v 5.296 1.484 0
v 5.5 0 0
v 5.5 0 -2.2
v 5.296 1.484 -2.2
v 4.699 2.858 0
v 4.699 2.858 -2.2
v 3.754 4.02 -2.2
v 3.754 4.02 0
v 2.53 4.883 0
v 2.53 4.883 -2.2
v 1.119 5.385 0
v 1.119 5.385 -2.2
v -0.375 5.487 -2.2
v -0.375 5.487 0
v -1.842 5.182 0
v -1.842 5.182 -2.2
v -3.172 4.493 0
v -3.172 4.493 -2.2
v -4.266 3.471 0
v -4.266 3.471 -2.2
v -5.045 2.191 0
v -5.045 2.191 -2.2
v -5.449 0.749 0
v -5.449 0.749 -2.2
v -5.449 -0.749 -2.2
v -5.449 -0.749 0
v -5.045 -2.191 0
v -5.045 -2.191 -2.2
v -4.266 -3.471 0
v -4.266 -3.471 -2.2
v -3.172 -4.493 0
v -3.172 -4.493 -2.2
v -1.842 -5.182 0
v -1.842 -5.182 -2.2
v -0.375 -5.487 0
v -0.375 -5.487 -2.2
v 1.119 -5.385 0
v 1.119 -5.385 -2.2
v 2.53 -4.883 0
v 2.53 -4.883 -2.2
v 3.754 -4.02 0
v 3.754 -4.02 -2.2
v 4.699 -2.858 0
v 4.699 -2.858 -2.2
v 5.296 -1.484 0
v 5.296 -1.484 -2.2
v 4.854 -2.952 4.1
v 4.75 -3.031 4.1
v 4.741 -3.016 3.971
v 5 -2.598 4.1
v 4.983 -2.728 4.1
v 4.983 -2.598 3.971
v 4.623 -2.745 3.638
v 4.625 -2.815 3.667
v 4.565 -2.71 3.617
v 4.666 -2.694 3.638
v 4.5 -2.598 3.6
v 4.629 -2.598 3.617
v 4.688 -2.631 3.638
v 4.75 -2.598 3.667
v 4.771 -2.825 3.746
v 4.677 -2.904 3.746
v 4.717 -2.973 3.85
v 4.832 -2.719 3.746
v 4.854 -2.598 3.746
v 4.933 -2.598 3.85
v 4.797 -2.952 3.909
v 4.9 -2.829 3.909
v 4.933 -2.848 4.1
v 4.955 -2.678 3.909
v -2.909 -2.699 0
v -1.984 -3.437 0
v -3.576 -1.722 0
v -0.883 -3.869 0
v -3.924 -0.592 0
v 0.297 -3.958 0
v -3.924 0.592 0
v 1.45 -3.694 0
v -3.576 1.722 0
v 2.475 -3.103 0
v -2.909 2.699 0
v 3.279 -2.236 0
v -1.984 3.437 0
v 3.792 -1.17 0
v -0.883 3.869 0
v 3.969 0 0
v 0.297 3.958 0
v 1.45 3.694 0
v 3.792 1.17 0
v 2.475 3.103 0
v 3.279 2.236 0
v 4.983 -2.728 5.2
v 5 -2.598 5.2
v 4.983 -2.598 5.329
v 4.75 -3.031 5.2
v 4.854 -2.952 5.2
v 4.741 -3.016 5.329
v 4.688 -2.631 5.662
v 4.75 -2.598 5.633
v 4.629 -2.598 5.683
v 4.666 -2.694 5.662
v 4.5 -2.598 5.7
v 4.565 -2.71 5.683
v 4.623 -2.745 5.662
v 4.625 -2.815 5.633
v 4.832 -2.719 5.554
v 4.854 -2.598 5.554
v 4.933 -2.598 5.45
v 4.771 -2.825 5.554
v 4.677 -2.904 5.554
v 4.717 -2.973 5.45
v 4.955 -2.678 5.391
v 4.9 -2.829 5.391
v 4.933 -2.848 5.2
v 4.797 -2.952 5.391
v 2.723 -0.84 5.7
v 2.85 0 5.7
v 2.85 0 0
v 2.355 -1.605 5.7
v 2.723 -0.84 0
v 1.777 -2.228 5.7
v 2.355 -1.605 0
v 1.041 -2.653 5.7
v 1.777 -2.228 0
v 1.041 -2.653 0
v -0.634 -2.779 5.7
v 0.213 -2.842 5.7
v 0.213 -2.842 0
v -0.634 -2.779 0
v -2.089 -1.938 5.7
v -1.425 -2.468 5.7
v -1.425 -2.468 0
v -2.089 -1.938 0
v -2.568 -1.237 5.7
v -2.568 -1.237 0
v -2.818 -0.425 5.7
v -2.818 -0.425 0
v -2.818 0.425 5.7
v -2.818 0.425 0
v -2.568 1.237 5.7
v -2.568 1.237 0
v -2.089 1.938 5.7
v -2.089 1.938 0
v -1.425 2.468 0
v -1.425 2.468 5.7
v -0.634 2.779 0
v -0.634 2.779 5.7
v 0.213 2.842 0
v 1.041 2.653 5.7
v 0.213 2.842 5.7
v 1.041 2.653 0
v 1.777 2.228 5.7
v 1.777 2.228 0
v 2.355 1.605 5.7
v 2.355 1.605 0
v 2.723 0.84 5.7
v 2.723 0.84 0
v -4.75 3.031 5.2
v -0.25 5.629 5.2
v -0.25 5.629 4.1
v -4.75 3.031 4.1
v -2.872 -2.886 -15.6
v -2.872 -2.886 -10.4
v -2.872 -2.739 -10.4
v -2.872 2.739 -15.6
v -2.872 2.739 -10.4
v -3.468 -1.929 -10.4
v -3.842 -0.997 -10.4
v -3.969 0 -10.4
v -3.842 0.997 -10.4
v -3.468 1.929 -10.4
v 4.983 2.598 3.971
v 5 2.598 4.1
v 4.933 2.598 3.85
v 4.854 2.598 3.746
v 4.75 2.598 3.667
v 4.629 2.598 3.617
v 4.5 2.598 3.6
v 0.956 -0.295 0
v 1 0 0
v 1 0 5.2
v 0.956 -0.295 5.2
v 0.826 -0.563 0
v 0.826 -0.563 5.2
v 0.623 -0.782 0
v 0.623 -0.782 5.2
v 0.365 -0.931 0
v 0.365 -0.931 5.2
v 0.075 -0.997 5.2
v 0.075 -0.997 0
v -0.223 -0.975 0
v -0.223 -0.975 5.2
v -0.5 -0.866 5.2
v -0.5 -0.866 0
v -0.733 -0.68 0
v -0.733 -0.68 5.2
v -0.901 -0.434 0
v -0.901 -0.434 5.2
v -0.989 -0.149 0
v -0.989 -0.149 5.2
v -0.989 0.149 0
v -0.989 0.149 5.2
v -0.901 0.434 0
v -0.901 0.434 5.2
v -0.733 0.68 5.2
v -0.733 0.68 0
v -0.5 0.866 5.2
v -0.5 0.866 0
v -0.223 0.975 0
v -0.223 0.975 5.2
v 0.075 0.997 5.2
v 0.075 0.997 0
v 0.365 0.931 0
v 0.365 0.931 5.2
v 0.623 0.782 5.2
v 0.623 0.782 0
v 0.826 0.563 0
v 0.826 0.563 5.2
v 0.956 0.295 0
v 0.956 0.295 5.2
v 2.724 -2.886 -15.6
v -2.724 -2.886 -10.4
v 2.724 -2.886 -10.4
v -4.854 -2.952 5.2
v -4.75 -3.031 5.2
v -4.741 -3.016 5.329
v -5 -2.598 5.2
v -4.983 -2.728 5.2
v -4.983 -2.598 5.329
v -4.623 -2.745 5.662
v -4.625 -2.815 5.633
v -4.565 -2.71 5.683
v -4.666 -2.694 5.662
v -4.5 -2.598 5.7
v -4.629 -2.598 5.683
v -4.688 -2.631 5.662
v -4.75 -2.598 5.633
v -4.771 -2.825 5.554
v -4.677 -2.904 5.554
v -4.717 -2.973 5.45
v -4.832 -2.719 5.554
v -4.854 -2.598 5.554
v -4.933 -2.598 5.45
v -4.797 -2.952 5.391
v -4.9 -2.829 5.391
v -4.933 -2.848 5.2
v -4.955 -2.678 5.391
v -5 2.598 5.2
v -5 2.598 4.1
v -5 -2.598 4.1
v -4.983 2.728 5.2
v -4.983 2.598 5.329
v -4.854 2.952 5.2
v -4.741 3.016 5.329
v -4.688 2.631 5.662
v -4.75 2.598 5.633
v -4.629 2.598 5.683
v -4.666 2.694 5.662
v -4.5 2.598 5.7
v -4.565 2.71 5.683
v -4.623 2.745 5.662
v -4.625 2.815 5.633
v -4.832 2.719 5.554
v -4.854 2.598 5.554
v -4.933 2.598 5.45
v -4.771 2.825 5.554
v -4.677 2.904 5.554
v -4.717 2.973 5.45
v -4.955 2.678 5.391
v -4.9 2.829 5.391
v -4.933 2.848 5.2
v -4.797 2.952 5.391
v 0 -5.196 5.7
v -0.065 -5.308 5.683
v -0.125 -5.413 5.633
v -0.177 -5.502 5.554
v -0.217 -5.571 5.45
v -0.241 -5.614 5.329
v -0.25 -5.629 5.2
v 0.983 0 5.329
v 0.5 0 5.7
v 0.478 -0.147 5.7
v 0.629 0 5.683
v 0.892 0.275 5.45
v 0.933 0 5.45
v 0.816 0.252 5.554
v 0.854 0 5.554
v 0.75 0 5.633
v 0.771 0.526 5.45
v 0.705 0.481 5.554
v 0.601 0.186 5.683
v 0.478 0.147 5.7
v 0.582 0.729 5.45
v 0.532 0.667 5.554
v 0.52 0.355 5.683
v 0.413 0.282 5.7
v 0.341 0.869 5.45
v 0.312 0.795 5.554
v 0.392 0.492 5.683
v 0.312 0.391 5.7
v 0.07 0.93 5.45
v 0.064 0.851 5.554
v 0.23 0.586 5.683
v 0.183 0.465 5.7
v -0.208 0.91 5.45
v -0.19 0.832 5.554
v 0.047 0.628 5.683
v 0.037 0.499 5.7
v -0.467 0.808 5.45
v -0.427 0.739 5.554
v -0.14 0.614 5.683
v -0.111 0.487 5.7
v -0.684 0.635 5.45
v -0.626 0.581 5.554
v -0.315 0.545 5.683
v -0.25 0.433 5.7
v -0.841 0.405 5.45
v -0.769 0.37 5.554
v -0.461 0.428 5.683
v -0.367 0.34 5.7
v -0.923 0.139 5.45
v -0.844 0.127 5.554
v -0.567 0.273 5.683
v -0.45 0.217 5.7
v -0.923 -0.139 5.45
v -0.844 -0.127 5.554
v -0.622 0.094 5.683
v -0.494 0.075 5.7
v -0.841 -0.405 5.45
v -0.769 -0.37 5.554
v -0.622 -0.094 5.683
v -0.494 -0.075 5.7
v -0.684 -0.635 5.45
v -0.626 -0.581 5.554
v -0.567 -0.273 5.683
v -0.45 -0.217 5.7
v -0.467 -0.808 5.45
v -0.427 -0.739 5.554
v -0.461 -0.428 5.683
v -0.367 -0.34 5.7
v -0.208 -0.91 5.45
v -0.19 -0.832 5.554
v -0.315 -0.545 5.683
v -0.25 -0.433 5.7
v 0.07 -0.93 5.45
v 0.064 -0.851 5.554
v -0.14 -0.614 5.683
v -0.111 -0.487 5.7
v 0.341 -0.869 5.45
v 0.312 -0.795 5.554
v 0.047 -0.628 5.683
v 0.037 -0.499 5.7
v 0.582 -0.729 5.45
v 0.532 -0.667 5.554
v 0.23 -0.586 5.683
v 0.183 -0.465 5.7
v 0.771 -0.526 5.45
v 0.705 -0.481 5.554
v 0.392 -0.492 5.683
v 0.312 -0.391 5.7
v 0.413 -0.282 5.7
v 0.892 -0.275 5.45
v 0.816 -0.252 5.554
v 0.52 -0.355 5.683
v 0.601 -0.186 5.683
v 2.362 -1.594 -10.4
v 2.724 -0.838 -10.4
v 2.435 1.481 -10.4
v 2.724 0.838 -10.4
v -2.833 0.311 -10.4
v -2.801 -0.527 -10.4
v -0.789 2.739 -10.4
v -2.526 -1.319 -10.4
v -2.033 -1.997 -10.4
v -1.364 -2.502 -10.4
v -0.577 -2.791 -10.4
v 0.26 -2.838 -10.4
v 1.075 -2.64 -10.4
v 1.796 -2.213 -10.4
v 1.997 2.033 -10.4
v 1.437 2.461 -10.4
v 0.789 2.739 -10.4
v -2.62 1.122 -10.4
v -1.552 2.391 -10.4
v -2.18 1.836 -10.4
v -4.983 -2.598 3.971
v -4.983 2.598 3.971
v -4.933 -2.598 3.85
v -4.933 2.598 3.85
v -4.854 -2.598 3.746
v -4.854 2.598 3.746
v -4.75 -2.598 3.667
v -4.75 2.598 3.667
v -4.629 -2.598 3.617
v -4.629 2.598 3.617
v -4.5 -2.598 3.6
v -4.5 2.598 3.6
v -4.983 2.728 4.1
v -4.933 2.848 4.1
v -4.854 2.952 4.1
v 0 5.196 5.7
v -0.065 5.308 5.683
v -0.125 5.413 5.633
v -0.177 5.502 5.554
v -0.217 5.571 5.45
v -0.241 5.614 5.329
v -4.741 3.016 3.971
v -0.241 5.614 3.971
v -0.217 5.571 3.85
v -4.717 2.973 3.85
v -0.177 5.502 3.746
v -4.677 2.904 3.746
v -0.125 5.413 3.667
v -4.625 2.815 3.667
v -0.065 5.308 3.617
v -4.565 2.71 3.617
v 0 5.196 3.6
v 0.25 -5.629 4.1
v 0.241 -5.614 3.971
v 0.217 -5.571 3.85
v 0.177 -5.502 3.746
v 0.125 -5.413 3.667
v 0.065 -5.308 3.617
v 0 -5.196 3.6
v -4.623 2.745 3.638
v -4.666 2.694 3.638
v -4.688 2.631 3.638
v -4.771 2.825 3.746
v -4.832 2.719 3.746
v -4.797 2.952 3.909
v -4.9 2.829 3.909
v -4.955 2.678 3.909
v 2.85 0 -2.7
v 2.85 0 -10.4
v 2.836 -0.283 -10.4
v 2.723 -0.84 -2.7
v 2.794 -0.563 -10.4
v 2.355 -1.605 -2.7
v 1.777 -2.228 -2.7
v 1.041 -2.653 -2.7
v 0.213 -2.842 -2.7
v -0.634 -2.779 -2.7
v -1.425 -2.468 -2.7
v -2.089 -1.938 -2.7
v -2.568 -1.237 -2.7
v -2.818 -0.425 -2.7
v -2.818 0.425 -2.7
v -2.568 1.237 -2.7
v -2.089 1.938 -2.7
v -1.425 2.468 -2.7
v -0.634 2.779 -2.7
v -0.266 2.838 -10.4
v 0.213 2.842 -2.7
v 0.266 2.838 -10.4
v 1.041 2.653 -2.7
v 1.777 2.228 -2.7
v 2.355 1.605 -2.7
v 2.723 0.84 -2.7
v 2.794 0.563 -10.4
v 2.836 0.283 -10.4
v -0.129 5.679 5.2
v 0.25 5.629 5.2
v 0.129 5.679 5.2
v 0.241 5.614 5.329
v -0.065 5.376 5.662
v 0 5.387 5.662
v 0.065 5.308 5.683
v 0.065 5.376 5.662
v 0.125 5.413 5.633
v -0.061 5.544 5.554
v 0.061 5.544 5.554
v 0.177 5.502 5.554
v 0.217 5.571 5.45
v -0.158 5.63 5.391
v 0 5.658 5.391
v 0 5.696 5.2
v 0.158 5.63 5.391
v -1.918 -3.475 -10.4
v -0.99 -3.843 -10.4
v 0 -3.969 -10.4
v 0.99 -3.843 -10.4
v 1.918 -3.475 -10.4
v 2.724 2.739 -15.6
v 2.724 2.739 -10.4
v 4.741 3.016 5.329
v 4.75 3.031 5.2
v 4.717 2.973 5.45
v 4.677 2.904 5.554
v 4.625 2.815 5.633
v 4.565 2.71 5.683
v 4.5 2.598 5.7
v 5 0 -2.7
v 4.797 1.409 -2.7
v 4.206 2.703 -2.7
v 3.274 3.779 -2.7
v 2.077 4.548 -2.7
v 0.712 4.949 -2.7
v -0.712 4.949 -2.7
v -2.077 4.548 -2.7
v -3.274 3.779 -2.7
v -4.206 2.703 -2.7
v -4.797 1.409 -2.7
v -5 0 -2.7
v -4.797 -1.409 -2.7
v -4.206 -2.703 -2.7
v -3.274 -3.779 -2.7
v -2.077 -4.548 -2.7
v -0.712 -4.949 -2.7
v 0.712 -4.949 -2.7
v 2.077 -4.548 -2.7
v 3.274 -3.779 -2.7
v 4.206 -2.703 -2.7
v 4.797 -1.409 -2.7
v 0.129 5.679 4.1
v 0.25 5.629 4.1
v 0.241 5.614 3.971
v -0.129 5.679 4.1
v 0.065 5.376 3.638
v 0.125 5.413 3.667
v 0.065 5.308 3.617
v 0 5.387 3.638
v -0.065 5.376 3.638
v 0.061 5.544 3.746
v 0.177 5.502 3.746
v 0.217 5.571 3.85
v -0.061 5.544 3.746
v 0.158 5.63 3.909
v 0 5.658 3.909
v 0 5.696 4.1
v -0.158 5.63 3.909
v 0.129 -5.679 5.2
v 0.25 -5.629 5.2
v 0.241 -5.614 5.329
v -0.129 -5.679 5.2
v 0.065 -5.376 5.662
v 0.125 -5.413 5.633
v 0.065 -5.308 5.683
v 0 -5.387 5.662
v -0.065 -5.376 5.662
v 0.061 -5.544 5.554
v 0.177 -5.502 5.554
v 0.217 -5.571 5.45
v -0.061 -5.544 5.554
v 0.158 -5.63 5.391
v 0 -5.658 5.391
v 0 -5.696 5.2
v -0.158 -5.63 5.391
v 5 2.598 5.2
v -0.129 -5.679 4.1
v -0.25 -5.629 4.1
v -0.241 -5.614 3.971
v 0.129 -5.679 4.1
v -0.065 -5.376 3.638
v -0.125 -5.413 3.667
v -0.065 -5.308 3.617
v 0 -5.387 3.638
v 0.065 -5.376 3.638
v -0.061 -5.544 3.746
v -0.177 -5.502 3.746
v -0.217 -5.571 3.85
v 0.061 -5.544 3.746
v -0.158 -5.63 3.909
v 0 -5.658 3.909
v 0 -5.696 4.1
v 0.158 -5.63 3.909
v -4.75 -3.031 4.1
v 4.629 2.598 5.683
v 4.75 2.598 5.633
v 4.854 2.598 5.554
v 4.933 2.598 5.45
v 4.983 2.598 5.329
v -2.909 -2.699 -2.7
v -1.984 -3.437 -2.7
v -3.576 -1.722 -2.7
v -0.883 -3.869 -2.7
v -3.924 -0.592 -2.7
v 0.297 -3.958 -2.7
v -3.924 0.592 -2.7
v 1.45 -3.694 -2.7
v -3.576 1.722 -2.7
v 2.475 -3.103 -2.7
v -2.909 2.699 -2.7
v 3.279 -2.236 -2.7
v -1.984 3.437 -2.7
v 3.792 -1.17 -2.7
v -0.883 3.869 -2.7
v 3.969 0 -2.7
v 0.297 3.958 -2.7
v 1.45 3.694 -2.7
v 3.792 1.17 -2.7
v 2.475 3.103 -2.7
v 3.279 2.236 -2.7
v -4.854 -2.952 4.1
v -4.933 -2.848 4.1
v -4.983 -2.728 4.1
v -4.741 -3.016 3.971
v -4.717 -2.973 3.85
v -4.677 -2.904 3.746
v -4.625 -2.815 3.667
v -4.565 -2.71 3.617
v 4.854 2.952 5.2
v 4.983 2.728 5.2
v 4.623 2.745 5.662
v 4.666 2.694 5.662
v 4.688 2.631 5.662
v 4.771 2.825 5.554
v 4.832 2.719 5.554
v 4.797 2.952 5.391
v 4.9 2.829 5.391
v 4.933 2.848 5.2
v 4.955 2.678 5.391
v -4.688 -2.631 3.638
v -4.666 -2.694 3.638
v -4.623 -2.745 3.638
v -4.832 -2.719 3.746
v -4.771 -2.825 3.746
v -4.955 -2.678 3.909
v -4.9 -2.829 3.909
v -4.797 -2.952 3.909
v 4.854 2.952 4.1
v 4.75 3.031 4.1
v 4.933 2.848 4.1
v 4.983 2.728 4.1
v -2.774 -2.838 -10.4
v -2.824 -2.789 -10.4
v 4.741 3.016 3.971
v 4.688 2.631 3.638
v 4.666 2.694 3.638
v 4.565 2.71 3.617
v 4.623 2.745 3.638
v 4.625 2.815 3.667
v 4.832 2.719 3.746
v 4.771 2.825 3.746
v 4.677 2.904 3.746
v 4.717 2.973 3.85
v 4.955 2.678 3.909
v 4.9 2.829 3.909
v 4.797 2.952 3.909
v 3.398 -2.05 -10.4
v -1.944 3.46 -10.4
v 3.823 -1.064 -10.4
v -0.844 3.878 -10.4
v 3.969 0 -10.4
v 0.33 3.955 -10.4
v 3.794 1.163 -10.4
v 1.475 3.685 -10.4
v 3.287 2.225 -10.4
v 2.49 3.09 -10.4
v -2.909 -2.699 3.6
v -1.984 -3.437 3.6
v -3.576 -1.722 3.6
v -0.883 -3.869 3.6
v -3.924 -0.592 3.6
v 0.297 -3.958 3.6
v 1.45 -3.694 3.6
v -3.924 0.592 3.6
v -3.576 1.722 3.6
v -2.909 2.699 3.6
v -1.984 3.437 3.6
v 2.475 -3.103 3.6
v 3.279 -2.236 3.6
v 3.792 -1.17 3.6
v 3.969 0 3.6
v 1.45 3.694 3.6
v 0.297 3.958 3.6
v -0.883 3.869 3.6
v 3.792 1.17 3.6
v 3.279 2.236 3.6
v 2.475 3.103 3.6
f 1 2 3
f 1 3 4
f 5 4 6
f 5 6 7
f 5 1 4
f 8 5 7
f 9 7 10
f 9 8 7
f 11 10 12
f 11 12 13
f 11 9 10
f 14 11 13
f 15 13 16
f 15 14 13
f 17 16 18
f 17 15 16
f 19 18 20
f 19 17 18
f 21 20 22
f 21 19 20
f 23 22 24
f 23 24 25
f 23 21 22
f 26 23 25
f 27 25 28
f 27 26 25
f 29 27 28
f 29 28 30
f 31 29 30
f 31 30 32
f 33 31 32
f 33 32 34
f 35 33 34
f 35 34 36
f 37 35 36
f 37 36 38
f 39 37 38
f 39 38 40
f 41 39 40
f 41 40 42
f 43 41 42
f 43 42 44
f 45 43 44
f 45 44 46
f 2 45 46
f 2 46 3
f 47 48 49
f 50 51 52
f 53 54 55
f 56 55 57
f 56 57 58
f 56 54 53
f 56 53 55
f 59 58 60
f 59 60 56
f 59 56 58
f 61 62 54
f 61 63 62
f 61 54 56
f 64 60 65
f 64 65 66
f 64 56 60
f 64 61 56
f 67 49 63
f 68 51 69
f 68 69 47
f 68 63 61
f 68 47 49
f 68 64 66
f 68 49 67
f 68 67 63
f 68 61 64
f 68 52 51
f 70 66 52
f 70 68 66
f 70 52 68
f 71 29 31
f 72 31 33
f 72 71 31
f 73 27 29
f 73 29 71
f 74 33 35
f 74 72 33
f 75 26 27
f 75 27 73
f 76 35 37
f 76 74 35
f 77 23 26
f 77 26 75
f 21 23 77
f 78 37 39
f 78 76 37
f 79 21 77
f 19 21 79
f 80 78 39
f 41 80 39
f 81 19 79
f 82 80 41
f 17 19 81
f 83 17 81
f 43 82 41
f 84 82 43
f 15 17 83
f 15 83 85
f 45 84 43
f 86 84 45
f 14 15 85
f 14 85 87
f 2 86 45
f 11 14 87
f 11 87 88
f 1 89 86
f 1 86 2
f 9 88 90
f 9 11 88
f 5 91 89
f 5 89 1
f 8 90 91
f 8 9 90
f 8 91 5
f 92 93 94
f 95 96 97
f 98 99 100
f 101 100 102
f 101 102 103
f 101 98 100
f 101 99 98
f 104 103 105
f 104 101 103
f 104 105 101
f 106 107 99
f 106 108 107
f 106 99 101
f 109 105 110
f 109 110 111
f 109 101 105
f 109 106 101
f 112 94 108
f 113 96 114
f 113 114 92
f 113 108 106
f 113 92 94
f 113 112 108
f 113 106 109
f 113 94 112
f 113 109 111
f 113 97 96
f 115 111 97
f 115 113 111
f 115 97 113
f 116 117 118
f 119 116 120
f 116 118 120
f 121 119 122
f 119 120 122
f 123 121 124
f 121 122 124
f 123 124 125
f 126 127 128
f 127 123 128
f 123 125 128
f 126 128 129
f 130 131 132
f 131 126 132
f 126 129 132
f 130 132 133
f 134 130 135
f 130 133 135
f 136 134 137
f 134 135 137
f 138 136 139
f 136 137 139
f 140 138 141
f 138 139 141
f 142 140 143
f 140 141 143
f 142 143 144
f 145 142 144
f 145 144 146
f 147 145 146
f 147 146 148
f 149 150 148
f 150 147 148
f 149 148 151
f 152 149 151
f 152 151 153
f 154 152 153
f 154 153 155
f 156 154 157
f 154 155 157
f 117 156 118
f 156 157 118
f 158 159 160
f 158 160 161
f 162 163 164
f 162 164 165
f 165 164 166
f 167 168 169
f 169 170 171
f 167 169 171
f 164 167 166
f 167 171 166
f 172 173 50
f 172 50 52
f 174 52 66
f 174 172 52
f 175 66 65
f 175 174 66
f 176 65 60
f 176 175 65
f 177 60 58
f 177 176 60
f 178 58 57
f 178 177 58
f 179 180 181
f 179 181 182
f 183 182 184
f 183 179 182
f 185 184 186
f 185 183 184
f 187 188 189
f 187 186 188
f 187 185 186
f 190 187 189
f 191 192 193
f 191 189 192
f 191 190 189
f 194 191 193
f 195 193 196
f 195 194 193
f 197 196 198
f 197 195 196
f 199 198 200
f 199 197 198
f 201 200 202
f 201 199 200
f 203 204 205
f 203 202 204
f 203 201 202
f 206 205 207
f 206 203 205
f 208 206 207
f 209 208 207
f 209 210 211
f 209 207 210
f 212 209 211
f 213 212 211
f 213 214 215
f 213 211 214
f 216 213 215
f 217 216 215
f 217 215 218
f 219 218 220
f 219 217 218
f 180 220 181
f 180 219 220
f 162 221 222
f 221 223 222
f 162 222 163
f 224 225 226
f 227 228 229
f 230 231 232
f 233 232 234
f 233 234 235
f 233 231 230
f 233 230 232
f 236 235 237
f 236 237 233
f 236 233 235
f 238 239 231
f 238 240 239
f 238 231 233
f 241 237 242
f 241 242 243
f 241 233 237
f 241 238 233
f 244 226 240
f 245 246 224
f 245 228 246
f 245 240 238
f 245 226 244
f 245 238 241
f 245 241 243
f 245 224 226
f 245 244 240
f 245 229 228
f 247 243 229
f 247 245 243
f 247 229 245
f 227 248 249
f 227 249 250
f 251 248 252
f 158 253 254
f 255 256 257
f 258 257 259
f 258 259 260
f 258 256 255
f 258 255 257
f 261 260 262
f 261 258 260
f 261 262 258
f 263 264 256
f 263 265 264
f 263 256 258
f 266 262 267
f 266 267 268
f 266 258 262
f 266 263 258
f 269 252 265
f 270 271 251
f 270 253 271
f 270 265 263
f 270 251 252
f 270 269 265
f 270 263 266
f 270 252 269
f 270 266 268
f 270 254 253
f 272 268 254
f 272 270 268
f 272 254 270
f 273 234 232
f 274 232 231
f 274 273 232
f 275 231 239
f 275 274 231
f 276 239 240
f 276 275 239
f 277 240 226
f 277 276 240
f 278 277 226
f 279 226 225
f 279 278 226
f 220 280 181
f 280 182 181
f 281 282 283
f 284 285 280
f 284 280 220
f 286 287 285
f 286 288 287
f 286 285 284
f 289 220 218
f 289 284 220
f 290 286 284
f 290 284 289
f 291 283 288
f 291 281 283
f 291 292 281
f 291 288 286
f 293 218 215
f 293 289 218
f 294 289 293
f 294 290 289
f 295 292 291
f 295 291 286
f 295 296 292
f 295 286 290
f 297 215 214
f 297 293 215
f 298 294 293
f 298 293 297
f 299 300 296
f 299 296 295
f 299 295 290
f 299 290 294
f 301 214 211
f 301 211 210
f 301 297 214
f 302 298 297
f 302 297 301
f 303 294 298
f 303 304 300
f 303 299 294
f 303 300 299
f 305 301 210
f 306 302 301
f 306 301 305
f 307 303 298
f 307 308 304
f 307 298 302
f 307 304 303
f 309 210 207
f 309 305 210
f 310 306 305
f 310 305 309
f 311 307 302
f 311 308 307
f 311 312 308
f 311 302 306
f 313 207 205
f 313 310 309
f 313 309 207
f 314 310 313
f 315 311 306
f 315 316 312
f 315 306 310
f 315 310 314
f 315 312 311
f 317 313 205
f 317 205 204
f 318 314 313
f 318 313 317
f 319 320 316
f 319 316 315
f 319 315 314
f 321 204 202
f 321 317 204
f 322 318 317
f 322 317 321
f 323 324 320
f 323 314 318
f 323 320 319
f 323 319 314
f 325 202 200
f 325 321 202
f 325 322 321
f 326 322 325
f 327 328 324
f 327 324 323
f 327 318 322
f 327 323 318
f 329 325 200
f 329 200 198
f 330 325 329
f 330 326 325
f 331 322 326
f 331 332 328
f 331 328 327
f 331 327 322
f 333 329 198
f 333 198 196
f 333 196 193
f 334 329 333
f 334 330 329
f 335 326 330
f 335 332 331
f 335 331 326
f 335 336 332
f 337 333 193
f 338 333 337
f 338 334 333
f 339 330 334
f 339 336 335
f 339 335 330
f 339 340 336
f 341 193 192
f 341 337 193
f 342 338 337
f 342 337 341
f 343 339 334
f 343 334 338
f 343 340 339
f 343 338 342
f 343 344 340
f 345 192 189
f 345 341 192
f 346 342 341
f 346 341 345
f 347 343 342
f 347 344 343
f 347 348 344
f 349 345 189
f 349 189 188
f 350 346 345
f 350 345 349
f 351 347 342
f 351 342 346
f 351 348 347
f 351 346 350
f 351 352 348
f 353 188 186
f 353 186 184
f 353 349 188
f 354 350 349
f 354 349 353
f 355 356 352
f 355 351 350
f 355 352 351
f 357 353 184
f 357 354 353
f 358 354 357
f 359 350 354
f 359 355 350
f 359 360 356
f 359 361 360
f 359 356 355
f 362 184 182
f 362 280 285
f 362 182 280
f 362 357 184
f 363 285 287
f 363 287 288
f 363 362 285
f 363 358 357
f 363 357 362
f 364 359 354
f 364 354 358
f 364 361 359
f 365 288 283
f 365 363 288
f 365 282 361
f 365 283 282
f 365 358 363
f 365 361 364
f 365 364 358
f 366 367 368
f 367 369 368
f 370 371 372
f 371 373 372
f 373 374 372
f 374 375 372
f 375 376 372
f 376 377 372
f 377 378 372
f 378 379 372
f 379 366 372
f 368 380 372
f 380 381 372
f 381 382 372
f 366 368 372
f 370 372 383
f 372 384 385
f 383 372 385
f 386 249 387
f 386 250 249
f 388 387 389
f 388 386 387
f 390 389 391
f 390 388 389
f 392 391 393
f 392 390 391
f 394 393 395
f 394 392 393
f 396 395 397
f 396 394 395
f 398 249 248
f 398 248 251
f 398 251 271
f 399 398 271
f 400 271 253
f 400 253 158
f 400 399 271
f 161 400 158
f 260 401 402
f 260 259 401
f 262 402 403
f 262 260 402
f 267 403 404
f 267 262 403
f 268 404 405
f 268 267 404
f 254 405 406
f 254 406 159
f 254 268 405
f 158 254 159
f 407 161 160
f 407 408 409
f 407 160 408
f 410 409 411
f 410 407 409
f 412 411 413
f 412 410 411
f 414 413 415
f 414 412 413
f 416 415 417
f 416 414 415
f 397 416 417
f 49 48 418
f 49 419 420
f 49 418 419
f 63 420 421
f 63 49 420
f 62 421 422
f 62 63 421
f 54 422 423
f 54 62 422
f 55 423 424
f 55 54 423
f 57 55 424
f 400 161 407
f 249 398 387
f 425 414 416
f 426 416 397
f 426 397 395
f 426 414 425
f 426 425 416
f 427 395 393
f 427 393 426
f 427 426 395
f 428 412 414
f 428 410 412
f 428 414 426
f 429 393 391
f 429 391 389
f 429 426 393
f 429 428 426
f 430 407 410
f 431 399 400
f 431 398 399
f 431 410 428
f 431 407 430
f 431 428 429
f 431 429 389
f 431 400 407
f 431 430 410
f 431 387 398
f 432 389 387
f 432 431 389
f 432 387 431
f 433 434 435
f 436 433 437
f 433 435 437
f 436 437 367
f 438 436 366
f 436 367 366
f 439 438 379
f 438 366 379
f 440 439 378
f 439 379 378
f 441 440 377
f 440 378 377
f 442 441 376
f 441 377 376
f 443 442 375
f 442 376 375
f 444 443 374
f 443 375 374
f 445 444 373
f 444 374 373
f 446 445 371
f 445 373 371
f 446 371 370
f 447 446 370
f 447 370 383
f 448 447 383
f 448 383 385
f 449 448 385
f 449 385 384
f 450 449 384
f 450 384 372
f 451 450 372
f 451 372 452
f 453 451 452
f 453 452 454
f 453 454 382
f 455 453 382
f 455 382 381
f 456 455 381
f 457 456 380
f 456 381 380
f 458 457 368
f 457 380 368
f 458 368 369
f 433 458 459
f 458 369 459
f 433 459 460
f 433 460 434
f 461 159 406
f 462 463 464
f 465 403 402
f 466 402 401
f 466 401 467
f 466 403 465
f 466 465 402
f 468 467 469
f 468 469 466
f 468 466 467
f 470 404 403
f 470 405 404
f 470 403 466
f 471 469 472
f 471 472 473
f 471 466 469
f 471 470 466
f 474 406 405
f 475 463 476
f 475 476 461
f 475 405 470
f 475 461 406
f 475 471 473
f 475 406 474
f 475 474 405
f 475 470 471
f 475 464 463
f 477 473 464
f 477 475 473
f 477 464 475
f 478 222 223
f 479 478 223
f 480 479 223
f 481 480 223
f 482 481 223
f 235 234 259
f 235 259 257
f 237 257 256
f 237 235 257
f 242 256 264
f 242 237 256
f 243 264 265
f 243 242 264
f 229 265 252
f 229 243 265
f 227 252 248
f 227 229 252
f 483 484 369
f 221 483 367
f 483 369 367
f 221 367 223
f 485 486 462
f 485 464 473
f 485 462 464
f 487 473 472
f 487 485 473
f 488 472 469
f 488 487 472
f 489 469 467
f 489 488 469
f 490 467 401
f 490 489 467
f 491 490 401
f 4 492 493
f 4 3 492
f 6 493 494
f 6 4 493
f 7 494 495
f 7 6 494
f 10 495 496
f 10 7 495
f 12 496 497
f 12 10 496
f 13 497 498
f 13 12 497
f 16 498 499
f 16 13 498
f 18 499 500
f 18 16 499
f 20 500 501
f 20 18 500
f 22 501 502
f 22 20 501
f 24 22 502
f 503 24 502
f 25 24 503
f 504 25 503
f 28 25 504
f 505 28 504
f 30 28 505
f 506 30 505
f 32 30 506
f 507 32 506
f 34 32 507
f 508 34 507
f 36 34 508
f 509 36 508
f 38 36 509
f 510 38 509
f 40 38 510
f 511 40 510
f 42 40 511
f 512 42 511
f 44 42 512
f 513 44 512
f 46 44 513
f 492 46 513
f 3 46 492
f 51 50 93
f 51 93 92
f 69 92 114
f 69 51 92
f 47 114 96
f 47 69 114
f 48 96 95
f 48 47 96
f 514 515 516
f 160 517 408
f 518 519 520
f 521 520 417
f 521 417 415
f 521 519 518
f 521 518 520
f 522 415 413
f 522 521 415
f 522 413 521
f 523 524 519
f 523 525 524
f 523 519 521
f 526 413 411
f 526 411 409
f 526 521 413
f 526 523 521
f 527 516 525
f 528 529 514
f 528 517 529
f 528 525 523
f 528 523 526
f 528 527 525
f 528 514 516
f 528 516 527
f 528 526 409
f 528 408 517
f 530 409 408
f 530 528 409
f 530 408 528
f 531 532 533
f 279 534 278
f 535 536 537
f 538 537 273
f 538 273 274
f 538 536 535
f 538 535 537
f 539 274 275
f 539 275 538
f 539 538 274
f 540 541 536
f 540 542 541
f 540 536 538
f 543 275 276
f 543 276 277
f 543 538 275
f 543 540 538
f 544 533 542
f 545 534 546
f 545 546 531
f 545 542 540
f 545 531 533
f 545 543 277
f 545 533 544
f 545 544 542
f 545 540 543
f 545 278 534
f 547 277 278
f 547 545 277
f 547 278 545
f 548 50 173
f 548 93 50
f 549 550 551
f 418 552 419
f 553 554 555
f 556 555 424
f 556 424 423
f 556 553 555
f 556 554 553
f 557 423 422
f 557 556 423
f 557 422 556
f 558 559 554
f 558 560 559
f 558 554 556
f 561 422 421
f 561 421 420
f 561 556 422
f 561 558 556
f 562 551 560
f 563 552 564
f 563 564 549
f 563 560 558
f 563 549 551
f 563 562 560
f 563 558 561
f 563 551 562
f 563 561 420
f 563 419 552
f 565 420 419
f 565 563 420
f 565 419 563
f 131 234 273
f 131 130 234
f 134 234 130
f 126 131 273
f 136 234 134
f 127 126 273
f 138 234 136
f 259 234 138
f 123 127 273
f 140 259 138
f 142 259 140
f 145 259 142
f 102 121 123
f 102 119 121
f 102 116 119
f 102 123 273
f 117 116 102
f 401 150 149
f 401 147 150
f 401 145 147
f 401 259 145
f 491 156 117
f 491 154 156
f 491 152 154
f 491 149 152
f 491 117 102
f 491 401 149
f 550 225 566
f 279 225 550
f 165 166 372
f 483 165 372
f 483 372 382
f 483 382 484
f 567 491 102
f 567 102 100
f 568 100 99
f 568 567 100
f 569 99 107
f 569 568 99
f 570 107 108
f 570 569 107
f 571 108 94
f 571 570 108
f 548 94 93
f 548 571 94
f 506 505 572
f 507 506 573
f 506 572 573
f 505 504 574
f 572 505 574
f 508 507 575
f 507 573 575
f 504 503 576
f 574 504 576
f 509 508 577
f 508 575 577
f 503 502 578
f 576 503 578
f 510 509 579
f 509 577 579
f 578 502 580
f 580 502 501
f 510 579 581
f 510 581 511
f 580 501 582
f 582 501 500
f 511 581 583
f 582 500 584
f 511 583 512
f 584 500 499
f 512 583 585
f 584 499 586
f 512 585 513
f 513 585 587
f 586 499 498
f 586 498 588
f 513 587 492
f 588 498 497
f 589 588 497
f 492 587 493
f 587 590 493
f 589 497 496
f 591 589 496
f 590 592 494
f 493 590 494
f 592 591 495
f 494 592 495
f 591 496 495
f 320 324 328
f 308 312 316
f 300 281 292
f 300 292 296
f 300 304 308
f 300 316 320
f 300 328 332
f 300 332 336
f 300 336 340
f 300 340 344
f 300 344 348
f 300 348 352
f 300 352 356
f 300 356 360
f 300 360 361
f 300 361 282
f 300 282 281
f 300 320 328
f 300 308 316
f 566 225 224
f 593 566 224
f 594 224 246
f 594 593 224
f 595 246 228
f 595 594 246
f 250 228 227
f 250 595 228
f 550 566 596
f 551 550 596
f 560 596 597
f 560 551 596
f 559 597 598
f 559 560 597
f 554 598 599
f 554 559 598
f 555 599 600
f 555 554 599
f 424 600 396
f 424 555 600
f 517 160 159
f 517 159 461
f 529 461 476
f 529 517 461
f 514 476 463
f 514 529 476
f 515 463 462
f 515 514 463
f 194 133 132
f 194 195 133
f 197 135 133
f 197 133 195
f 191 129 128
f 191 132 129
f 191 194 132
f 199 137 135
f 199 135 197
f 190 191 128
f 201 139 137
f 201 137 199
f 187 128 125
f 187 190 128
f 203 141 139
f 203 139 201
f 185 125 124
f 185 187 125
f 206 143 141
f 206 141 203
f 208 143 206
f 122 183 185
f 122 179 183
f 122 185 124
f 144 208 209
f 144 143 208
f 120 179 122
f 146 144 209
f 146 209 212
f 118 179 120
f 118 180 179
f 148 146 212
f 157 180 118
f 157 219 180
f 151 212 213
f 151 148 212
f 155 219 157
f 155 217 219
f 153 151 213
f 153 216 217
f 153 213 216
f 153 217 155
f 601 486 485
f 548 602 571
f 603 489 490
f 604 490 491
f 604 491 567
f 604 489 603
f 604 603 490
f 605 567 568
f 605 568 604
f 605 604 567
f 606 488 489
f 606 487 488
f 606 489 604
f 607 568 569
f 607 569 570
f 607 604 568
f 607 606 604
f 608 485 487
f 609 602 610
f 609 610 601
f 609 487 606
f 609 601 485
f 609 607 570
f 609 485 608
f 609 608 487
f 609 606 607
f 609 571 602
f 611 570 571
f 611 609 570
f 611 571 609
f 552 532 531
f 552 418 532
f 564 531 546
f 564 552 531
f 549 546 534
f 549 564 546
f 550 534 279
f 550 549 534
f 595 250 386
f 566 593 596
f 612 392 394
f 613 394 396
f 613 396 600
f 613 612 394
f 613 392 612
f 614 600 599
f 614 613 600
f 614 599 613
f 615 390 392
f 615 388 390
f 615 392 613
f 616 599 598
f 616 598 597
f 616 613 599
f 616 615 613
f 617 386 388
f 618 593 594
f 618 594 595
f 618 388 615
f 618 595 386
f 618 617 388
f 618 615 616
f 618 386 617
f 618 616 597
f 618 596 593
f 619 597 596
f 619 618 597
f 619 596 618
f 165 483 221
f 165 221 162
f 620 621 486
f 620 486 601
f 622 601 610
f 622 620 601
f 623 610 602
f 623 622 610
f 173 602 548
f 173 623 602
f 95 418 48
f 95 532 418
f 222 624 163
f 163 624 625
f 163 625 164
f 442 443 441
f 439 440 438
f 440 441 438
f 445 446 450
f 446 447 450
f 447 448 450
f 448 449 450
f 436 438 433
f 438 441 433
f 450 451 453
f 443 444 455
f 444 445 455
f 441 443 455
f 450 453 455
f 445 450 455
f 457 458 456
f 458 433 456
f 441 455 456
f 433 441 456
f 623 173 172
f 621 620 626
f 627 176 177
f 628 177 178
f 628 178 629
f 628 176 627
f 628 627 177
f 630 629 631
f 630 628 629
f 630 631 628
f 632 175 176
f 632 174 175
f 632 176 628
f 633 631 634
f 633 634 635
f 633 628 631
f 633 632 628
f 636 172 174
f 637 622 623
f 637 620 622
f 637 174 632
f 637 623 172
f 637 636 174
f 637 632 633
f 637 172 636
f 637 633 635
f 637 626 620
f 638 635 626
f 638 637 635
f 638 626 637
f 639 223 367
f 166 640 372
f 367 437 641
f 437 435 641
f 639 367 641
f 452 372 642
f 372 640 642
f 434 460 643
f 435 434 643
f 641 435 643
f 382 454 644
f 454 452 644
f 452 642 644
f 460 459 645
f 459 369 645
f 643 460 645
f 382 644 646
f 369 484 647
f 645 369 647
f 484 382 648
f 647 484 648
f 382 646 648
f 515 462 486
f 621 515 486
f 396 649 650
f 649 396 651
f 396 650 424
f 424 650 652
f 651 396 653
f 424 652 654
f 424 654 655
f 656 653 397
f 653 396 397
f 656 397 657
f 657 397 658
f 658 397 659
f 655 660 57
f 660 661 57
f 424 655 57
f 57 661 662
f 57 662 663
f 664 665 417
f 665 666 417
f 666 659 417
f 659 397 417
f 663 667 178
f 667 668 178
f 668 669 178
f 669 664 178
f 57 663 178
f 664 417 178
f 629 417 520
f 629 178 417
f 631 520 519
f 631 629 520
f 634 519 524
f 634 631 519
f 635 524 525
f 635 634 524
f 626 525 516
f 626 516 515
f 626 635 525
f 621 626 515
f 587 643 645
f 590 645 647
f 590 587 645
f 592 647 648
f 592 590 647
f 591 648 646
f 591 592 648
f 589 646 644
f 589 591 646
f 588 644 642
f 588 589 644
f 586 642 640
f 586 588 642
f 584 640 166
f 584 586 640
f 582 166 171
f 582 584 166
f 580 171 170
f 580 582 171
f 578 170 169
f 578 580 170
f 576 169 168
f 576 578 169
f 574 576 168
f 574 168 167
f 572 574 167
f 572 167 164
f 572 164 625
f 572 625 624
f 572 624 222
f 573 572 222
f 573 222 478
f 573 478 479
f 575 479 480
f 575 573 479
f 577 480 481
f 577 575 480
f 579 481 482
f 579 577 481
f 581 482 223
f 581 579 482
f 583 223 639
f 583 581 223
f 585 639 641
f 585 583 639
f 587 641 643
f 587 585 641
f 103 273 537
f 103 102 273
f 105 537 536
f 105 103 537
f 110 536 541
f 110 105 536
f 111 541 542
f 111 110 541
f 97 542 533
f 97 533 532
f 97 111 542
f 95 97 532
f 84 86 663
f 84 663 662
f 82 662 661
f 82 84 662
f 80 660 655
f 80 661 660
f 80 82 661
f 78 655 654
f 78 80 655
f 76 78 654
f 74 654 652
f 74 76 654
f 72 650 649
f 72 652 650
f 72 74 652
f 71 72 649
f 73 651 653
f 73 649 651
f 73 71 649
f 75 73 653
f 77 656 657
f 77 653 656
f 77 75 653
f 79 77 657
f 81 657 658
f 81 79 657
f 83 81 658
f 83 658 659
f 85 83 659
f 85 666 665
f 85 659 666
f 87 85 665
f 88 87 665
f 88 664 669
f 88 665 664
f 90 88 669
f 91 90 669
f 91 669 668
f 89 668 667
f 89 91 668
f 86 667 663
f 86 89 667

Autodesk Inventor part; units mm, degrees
ref_plane "YZ Plane" through (0, 0, 0) normal (1, 0, 0) x (0, 1, 0)
ref_plane "XZ Plane" through (0, 0, 0) normal (0, 1, 0) x (-1, 0, 0)
ref_plane "XY Plane" through (0, 0, 0) normal (0, 0, 1) x (1, 0, 0)
sketch "Sketch1" plane through (0, 0, 0) normal (0, 0, 1) x (1, 0, 0)
  circle A0 centre (0, 0) radius 5.5
  circle A1 centre (0, 0) radius 1
  circle A2 centre (0, 0) radius 3.9688
  circle A3 centre (0, 0) radius 2.85
  dimension "d0" = 11
  dimension "d1" = 2
  dimension "d2" = 7.9375
  dimension "d3" = 5.7
extrude "Extrusion1" add sketch "Sketch1" along normal blind 5.7 and the other way blind 10.4 contours A2
extrude "Extrusion2" add sketch "Sketch1" against normal blind 2.7 contours A0
extrude "Extrusion3" add sketch "Sketch1" along normal blind 5.7 contours A1
extrude "Extrusion4" add sketch "Sketch1" against normal blind 2.7 contours A1 | A2 | A3
sketch "Sketch2" plane through (0, 0, -10.4) normal (0, 0, -1) x (-1, 0, 0)
  circle A0 centre (0, 0) radius 3.9688 projected
  line L0 (2.8725, 2.7386) -> (-2.7241, 2.7386)
  line L1 (-2.7241, 2.7386) -> (-2.7241, -2.8862)
  line L2 (-2.7241, -2.8862) -> (2.8725, -2.8862)
  line L3 (2.8725, -2.8862) -> (2.8725, 2.7386)
extrude "Extrusion5" add sketch "Sketch2" along normal blind 5.2 contours L3 A0 L2 L1 L0 | L3 L2 A0
sketch "Sketch3" plane through (0, 0, 5.7) normal (0, 0, 1) x (1, 0, 0)
  line L0 (5, -2.8868) -> (5, 2.8868)
  line L1 (0, 5.7735) -> (5, 2.8868)
  line L2 (0, 5.7735) -> (-5, 2.8868)
  line L3 (-5, 2.8868) -> (-5, -2.8868)
  line L4 (-5, -2.8868) -> (0, -5.7735)
  line L5 (0, -5.7735) -> (5, -2.8868)
  circle A0 centre (0, 0) radius 3.9688
extrude "Extrusion6" add sketch "Sketch3" against normal blind 2.1
fillet "Fillet1" radius 0.5 18 edges at (-2.5, -4.3301, 5.7) (2.5, -4.3301, 5.7) (2.5, -4.3301, 3.6) (-2.5, -4.3301, 3.6) (-5, 0, 3.6) (-5, 0, 5.7) (5, 0, 5.7) (2.5, 4.3301, 5.7) (-2.5, 4.3301, 5.7) (0, -5.7735, 4.65) (5, -2.8868, 4.65) (-5, -2.8868, 4.65) (-5, 2.8868, 4.65) (-2.5, 4.3301, 3.6) (0, 5.7735, 4.65) (2.5, 4.3301, 3.6) (5, 2.8868, 4.65) (5, 0, 3.6)
fillet "Fillet2" radius 0.5 1 edges at (-1, 0, 5.7)
chamfer "Chamfer1" distance 0.5 angle 45 1 edges at (-5.5, 0, -2.7)
thread "Thread1" size "5/16-12" class "2B" standard "Inch Tapping Threads" length 15.255
properties part number "Power_Socket"
